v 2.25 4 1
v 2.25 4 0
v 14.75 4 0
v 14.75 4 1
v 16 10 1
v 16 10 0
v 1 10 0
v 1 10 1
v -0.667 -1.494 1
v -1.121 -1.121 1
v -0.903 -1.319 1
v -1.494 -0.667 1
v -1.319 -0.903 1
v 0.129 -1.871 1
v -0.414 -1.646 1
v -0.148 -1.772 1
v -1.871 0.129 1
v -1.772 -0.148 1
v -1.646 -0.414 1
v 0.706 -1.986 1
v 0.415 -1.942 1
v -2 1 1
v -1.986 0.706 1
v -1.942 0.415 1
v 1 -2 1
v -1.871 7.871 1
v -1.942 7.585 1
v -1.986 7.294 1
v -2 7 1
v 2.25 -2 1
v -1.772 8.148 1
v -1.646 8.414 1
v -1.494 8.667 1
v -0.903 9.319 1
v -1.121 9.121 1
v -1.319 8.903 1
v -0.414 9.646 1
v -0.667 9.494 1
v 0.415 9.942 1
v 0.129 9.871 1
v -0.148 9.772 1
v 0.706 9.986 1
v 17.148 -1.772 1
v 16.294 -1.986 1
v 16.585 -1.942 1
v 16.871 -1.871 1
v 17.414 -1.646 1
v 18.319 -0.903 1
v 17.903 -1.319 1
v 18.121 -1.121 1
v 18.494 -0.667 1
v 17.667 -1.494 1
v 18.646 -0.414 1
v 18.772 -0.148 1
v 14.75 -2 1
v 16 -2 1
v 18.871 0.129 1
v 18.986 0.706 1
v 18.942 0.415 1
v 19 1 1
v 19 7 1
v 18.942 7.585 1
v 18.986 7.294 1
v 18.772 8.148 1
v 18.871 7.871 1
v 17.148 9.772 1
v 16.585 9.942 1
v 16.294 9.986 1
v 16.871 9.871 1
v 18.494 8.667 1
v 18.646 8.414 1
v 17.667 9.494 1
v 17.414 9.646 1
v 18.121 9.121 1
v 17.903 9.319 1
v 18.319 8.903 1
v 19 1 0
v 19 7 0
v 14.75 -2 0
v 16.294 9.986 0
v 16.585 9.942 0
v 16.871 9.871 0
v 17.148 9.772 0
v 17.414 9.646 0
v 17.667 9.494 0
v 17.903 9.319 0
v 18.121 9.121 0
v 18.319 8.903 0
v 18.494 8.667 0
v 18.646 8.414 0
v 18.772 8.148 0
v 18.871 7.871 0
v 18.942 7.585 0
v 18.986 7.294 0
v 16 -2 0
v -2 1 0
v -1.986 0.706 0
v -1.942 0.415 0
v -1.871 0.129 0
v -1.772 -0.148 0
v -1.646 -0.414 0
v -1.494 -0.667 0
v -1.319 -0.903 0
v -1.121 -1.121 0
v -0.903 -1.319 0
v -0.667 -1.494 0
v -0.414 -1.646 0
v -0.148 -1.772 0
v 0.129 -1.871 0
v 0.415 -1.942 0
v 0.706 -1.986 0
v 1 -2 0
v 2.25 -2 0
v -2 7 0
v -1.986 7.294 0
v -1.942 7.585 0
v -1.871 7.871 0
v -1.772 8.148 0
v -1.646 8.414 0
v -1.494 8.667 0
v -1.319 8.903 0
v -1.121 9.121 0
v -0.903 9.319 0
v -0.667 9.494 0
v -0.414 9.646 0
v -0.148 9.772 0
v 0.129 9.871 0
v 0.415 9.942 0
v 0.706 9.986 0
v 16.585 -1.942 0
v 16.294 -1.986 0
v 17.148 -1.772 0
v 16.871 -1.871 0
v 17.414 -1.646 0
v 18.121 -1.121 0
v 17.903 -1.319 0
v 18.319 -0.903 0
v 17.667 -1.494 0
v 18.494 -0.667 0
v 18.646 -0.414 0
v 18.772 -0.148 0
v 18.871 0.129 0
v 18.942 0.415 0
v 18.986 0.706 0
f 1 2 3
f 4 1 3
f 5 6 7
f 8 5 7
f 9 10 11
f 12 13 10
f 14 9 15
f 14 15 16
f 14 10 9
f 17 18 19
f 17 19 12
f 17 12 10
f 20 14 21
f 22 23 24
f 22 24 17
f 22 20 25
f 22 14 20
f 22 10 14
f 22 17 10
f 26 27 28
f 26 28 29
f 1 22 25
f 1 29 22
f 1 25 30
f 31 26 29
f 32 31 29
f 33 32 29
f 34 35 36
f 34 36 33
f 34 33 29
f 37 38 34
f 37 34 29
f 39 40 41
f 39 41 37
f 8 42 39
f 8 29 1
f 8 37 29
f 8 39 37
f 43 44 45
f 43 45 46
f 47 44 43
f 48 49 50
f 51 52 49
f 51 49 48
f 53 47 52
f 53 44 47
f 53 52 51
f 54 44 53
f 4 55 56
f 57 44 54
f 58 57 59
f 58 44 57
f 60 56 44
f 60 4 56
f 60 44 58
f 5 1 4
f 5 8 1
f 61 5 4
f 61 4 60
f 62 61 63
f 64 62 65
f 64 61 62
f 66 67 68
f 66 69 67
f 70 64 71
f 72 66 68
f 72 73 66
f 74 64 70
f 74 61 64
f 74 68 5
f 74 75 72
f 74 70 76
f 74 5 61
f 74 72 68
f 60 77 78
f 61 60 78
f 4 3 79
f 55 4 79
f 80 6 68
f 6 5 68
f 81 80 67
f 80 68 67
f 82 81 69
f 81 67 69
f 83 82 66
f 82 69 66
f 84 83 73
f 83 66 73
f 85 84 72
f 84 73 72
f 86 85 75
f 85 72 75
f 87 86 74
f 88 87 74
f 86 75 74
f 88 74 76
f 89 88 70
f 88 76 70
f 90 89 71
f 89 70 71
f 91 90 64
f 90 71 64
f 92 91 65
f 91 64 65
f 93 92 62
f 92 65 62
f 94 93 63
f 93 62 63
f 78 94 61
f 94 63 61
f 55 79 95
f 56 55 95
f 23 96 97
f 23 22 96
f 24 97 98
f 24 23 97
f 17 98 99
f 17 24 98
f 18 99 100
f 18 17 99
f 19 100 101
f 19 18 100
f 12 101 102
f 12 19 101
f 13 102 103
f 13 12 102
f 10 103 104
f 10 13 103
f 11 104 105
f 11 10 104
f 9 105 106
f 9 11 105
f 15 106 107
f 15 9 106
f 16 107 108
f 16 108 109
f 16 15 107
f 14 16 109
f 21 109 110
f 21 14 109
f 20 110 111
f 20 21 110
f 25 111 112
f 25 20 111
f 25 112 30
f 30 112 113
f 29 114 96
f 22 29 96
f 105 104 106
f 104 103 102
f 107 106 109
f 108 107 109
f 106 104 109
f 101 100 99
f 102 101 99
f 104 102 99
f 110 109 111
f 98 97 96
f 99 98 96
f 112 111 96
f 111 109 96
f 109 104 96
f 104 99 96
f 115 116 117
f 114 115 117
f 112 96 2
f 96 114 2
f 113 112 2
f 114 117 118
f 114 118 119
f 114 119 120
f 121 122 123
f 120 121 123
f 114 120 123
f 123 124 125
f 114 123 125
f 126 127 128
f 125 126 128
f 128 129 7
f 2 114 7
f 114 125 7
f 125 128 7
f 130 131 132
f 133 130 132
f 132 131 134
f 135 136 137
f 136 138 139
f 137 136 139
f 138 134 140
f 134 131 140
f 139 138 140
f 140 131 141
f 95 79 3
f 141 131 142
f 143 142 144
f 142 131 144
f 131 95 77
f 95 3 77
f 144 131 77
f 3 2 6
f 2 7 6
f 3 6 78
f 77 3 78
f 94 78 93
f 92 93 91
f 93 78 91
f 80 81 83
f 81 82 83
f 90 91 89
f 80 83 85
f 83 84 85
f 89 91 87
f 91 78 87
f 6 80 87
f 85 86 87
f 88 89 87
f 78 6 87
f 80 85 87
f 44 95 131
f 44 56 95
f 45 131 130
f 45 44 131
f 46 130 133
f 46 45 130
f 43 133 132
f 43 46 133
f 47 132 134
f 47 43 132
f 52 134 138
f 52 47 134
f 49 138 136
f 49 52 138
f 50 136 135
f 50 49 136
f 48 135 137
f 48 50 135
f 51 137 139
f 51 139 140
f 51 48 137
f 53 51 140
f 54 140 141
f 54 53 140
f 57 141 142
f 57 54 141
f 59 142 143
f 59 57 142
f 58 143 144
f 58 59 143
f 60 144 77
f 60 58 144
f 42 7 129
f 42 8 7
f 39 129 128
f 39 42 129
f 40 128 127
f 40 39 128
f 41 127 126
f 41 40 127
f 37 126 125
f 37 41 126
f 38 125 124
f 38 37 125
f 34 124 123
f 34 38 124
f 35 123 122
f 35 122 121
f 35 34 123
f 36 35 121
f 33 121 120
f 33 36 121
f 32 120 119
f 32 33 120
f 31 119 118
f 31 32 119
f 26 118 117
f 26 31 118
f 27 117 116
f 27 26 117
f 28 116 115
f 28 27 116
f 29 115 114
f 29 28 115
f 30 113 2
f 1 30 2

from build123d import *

# Parameters (mm, degrees)
BOSS_EXTRUDE1_DEPTH = 1
FILLET2_R           = 3


with BuildPart() as part:
    # Sketch1 → Boss-Extrude1 (new body)
    with BuildSketch(Plane.XY):
        Polygon((19, 10), (8.5, 10), (8.5, 8), (17, 8), (17, 0), (14.75, 0), (14.75, -2), (19, -2), align=None)
        Polygon((-2, 10), (-2, -2), (2.25, -2), (2.25, 0), (0, 0), (0, 8), (8.5, 8), (8.5, 10), align=None)
        Polygon((0, 0), (2.25, 0), (2.25, 1), (1, 1), (1, 7), (8.5, 7), (8.5, 8), (0, 8), align=None)
        Polygon((1, 1), (2.25, 1), (2.25, 4), (8.5, 4), (8.5, 7), (1, 7), align=None)
        Polygon((16, 7), (8.5, 7), (8.5, 4), (14.75, 4), (14.75, 1), (16, 1), align=None)
        Polygon((17, 8), (8.5, 8), (8.5, 7), (16, 7), (16, 1), (14.75, 1), (14.75, 0), (17, 0), align=None)
    extrude(amount=BOSS_EXTRUDE1_DEPTH)

    # Fillet2
    fillet2_edges = [part.edges().sort_by_distance(p)[0] for p in [
        (-2, -2, 0.5),
        (-2, 10, 0.5),
        (19, 10, 0.5),
        (19, -2, 0.5),
    ]]
    fillet(fillet2_edges, radius=FILLET2_R)


solid = part.part
